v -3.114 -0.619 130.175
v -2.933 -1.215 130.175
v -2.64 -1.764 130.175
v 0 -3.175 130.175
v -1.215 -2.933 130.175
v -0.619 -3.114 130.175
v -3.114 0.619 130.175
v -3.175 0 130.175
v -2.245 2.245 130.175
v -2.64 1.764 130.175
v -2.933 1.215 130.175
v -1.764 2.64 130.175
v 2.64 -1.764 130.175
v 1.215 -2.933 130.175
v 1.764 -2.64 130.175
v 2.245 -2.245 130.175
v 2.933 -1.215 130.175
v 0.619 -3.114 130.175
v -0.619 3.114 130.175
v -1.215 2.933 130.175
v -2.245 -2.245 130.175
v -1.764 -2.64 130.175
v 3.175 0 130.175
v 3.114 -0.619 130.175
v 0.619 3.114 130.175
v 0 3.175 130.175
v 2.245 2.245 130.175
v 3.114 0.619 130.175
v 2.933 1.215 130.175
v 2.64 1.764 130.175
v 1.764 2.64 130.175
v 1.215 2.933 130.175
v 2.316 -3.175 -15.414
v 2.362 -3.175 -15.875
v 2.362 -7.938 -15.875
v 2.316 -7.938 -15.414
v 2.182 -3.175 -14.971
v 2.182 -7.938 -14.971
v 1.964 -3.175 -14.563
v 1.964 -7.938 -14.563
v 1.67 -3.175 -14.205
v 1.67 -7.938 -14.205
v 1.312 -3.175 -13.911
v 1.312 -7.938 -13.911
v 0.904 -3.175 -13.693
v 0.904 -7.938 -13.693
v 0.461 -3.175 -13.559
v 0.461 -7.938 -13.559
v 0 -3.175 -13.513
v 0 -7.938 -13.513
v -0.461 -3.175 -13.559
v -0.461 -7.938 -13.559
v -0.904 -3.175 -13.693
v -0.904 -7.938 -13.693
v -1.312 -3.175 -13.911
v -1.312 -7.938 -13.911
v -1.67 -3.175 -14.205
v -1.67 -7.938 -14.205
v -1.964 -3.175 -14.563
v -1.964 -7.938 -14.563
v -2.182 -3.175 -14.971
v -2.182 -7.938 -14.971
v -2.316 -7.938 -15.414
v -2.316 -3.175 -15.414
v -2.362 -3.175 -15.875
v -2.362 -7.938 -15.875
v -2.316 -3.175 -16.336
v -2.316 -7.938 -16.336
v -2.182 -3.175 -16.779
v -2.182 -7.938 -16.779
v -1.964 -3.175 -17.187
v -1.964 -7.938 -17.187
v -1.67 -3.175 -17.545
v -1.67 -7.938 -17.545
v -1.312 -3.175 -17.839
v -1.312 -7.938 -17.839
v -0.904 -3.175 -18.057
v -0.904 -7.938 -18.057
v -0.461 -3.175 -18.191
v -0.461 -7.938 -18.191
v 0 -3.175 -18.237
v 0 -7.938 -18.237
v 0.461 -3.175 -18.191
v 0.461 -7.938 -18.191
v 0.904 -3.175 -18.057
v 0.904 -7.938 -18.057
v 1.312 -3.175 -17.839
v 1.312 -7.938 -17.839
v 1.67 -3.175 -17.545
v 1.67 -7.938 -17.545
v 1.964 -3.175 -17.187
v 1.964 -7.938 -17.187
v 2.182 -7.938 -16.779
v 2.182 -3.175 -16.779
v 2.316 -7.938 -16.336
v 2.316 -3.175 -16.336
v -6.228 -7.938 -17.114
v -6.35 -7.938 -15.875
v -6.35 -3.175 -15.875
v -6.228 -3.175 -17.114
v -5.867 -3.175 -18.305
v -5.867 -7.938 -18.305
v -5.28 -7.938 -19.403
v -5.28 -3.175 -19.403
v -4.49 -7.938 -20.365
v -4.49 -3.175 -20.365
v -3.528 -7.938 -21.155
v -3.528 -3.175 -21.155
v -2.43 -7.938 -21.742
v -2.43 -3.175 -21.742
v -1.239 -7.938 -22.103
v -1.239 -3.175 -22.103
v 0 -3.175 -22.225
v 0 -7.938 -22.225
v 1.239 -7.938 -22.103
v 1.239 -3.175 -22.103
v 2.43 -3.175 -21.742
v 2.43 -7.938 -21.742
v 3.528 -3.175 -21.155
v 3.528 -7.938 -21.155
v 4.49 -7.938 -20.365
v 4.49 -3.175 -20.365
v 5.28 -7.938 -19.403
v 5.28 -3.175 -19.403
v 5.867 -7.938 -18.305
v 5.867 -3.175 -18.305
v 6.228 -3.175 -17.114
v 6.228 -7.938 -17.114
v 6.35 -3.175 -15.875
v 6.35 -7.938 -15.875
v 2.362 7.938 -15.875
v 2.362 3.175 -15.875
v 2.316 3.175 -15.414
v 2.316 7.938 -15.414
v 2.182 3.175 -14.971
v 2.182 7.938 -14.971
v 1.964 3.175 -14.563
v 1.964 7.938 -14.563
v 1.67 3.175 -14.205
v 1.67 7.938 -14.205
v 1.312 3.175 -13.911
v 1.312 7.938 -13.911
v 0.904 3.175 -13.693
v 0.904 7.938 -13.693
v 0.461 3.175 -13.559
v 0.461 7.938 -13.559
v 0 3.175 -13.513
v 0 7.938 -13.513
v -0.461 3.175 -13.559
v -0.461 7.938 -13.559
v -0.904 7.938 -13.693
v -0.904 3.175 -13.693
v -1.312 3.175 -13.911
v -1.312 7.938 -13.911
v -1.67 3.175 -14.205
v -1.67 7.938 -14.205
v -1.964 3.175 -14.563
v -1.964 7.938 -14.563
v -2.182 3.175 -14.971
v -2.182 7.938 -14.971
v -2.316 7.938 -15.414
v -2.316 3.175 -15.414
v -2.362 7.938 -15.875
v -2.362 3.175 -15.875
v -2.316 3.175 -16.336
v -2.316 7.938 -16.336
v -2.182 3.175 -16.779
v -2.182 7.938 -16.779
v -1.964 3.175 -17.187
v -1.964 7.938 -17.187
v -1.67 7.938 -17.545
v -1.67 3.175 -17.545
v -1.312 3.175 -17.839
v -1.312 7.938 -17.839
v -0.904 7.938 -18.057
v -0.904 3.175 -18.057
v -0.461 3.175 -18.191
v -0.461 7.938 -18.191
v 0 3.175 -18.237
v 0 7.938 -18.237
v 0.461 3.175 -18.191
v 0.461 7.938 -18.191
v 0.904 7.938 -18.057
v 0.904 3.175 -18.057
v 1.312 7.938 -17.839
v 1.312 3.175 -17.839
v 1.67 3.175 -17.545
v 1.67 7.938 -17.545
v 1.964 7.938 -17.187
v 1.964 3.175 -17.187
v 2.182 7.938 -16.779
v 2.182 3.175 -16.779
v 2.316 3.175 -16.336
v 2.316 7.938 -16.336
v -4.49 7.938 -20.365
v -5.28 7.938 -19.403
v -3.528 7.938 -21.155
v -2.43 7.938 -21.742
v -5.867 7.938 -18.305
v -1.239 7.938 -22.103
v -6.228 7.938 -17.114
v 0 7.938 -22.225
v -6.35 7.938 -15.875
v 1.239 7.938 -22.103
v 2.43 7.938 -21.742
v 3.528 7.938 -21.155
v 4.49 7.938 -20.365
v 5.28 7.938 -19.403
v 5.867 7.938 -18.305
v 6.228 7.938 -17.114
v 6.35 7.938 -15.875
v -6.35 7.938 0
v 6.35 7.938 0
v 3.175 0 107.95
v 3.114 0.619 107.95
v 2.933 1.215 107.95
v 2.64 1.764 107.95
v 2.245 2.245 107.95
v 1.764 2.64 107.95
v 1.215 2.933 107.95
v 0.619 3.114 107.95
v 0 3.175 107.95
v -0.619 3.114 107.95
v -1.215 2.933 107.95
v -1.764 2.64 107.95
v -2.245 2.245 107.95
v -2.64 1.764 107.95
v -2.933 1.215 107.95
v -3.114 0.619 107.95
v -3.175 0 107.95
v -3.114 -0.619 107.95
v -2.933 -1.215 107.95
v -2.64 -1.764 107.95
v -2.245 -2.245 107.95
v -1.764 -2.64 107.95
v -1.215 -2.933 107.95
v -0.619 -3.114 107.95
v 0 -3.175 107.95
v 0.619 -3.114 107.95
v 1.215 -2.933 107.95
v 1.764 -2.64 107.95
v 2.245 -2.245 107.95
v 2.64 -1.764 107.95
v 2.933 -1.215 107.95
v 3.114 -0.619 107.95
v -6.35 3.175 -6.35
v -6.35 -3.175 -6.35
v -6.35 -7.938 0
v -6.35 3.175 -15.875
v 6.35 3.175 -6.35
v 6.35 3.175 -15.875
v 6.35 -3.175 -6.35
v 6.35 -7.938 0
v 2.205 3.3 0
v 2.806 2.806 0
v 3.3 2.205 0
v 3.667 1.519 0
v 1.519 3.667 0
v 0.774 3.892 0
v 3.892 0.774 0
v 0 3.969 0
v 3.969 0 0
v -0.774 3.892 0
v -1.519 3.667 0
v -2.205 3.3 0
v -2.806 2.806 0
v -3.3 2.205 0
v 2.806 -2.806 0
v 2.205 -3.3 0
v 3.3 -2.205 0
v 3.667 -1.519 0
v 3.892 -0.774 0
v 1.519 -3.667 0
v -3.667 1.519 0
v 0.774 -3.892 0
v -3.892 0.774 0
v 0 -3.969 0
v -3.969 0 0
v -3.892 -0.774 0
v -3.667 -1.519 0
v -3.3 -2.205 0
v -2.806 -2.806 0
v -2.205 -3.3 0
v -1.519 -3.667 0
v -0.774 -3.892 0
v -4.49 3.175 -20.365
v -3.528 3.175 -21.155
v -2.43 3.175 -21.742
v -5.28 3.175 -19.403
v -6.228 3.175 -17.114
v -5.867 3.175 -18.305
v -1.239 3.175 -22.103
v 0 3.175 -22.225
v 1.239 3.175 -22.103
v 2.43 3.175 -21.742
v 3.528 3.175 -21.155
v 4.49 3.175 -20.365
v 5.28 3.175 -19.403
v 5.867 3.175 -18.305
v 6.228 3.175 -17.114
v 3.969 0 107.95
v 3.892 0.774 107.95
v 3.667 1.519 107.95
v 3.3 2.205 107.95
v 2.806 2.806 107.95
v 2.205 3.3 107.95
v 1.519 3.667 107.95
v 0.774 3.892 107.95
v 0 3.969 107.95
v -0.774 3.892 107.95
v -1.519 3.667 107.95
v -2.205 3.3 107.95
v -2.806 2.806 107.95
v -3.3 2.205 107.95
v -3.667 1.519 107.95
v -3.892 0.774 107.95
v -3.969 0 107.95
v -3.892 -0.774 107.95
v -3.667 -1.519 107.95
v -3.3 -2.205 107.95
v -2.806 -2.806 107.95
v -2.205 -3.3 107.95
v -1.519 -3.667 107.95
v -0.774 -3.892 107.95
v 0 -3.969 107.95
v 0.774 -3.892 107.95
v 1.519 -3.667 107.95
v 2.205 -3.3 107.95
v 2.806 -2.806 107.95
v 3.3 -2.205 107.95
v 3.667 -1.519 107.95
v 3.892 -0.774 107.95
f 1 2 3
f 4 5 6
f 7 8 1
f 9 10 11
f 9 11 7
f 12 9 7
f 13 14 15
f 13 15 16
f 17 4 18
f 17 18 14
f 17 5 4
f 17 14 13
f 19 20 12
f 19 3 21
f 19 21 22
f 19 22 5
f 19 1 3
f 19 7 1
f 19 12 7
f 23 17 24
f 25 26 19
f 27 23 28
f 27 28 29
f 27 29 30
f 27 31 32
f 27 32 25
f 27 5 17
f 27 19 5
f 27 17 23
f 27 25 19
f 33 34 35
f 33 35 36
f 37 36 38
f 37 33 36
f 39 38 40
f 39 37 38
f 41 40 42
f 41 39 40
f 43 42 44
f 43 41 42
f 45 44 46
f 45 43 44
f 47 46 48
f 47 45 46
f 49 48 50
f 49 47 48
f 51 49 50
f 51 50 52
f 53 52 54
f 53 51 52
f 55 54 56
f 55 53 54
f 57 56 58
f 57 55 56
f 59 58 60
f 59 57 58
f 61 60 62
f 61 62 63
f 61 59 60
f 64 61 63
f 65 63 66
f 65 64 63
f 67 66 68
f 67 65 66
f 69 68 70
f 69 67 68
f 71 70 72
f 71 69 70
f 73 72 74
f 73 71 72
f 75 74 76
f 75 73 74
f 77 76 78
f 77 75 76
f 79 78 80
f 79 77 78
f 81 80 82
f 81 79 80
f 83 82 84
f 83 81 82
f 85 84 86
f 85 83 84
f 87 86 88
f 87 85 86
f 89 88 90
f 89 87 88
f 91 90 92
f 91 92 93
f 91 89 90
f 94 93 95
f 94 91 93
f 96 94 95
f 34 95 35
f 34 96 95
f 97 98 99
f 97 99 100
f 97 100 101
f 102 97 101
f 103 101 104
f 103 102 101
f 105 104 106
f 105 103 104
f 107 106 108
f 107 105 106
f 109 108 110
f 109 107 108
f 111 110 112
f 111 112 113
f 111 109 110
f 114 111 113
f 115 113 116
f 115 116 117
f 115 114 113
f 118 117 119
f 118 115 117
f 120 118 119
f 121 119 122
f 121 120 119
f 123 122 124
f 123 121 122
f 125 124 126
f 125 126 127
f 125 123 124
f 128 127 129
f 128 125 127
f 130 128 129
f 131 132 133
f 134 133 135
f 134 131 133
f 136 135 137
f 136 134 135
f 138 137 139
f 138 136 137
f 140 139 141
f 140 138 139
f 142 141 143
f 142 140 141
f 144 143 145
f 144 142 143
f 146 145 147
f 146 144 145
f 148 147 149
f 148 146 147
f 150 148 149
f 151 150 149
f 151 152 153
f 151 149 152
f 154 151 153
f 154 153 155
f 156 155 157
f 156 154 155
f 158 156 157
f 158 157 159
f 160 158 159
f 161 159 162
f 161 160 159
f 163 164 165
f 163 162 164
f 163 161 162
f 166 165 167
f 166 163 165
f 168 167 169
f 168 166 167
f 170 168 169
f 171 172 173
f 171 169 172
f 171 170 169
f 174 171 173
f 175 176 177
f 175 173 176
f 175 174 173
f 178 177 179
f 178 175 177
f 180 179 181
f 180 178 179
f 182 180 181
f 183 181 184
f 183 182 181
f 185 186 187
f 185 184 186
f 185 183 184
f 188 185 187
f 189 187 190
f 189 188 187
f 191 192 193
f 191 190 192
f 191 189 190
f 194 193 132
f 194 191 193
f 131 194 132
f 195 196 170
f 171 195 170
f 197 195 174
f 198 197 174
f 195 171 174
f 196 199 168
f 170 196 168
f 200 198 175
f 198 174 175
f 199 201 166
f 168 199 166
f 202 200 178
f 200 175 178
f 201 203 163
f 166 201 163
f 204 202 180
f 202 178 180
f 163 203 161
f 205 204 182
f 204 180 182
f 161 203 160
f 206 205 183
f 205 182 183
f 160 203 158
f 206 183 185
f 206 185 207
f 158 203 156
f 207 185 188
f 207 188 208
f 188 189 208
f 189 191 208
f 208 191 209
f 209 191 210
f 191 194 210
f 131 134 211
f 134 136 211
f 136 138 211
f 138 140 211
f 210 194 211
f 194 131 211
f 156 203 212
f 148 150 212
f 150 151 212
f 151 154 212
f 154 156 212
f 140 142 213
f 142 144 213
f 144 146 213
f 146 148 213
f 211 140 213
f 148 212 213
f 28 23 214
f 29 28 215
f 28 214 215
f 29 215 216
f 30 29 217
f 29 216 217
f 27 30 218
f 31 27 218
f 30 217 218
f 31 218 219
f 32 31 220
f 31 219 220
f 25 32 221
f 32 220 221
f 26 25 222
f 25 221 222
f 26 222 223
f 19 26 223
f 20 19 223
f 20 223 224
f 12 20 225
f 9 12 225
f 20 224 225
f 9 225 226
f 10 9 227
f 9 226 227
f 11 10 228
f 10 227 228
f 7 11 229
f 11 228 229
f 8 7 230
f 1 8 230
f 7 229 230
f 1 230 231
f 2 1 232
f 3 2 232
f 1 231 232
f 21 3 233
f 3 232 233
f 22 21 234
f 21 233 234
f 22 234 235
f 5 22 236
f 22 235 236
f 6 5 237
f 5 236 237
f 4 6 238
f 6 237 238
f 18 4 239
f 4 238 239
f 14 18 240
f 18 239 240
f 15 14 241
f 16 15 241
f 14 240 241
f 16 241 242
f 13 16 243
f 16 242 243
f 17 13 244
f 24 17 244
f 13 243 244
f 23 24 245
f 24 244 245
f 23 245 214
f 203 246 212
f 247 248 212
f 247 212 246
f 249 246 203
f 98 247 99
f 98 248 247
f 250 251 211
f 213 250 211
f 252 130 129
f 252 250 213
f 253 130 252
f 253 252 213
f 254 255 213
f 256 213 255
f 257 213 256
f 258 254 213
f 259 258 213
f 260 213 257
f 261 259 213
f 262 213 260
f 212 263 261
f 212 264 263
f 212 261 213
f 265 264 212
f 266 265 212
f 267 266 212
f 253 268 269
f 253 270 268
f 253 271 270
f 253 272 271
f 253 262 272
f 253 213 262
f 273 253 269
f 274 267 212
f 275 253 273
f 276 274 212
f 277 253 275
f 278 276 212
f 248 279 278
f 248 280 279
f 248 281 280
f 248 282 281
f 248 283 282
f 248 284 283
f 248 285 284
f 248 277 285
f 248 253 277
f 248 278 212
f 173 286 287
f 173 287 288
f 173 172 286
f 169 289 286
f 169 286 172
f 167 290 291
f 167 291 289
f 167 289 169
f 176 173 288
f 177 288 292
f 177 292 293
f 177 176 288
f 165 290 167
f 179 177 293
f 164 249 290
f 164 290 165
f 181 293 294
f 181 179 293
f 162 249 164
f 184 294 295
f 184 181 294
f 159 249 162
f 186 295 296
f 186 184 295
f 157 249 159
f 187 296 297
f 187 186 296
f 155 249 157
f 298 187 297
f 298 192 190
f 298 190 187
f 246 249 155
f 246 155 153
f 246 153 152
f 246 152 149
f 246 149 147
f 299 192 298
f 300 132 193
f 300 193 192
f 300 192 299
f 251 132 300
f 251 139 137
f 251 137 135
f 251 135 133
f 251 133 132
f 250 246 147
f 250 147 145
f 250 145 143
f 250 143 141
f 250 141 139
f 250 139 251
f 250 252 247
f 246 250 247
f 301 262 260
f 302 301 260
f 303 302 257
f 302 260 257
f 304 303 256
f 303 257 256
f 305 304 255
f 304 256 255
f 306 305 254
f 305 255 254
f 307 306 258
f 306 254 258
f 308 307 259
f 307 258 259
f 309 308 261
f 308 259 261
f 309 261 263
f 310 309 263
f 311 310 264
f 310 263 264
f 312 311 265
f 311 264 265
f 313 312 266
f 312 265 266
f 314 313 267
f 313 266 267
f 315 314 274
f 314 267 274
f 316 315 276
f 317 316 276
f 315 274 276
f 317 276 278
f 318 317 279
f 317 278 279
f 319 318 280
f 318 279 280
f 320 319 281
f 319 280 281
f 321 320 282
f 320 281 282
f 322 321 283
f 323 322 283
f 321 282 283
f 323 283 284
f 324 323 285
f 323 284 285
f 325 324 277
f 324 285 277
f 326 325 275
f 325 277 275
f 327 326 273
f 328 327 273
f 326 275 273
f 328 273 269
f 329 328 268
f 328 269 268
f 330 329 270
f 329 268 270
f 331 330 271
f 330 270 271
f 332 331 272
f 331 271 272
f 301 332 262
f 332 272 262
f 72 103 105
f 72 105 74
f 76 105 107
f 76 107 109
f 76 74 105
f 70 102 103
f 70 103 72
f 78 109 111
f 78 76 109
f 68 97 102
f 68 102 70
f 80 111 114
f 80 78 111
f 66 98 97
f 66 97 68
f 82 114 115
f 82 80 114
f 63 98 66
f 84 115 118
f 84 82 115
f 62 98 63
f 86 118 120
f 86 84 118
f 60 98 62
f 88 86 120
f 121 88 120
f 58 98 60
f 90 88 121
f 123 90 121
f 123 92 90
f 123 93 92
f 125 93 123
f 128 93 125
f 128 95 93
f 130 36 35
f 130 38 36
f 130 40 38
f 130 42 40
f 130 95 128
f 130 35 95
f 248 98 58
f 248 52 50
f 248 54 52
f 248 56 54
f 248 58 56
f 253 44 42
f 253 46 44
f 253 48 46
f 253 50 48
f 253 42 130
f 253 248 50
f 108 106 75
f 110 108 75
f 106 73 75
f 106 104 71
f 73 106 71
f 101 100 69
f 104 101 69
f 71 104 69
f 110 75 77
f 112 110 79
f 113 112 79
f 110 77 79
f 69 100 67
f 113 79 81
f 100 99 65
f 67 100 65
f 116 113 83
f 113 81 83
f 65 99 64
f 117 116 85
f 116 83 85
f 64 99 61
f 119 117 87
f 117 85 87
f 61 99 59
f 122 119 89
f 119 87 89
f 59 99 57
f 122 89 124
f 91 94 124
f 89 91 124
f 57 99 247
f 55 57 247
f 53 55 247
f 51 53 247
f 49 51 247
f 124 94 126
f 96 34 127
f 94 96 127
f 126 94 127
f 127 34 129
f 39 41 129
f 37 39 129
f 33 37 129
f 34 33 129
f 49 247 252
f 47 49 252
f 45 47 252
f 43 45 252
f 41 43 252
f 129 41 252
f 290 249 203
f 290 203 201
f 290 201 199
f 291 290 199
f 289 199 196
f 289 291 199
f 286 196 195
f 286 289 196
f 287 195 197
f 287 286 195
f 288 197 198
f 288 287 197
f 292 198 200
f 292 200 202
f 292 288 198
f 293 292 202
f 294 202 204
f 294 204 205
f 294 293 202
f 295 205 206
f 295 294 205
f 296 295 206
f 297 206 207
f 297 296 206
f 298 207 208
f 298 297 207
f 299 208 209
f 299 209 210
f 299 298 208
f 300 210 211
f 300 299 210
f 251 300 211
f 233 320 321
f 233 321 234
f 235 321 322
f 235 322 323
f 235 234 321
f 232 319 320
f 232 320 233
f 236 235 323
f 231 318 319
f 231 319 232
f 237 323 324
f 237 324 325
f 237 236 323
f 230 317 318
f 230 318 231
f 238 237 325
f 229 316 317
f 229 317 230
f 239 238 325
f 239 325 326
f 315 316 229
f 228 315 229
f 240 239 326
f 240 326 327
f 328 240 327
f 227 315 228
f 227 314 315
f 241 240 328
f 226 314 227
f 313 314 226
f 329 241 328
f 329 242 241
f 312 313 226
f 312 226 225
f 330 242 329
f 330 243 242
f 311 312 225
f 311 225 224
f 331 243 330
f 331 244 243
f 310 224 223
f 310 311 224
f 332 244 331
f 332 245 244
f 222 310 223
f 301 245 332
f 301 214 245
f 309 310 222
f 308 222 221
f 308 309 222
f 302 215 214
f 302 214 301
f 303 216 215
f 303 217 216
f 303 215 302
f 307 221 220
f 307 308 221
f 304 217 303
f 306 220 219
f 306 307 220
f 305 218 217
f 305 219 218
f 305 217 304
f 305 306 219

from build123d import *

# Parameters (mm, degrees)
F0_R     = 3.96875
F1_DEPTH = 107.95
F2_R     = 3.175
F3_DEPTH = 22.225
F4_R     = 2.361553
F5_DEPTH = 7.9375
F7_DEPTH = 3.175


with BuildPart() as f1:
    # F0 (on Top) → F1 (new body)
    with BuildSketch(Plane.XY):
        Circle(F0_R)
    extrude(amount=F1_DEPTH)

    # F2 (on face) → F3 (join)
    with BuildSketch(Plane.XY.offset(107.95)):
        Circle(F2_R)
    extrude(amount=F3_DEPTH)

    # F4 (on Front) → F5 (join, symmetric)
    with BuildSketch(Plane.XZ):
        with BuildLine():
            Line((3.96875, 0), (-3.96875, 0))
            Line((-3.96875, 0), (-6.35, 0))
            Line((-6.35, 0), (-6.35, -15.875))
            ThreePointArc((-6.35, -15.875), (0, -22.225), (6.35, -15.875))
            Line((6.35, -15.875), (6.35, 0))
            Line((6.35, 0), (3.96875, 0))
        make_face()
        with Locations((0, -15.875)):
            Circle(F4_R, mode=Mode.SUBTRACT)
    extrude(amount=F5_DEPTH, both=True)

    # F6 (on Front) → F7 (cut, symmetric)
    with BuildSketch(Plane.XZ):
        with BuildLine():
            Line((6.35, -15.875), (6.35, -6.35))
            Line((6.35, -6.35), (-6.35, -6.35))
            Line((-6.35, -6.35), (-6.35, -15.875))
            ThreePointArc((-6.35, -15.875), (0, -22.225), (6.35, -15.875))
        make_face()
    extrude(amount=F7_DEPTH, both=True, mode=Mode.SUBTRACT)


solid = f1.part
